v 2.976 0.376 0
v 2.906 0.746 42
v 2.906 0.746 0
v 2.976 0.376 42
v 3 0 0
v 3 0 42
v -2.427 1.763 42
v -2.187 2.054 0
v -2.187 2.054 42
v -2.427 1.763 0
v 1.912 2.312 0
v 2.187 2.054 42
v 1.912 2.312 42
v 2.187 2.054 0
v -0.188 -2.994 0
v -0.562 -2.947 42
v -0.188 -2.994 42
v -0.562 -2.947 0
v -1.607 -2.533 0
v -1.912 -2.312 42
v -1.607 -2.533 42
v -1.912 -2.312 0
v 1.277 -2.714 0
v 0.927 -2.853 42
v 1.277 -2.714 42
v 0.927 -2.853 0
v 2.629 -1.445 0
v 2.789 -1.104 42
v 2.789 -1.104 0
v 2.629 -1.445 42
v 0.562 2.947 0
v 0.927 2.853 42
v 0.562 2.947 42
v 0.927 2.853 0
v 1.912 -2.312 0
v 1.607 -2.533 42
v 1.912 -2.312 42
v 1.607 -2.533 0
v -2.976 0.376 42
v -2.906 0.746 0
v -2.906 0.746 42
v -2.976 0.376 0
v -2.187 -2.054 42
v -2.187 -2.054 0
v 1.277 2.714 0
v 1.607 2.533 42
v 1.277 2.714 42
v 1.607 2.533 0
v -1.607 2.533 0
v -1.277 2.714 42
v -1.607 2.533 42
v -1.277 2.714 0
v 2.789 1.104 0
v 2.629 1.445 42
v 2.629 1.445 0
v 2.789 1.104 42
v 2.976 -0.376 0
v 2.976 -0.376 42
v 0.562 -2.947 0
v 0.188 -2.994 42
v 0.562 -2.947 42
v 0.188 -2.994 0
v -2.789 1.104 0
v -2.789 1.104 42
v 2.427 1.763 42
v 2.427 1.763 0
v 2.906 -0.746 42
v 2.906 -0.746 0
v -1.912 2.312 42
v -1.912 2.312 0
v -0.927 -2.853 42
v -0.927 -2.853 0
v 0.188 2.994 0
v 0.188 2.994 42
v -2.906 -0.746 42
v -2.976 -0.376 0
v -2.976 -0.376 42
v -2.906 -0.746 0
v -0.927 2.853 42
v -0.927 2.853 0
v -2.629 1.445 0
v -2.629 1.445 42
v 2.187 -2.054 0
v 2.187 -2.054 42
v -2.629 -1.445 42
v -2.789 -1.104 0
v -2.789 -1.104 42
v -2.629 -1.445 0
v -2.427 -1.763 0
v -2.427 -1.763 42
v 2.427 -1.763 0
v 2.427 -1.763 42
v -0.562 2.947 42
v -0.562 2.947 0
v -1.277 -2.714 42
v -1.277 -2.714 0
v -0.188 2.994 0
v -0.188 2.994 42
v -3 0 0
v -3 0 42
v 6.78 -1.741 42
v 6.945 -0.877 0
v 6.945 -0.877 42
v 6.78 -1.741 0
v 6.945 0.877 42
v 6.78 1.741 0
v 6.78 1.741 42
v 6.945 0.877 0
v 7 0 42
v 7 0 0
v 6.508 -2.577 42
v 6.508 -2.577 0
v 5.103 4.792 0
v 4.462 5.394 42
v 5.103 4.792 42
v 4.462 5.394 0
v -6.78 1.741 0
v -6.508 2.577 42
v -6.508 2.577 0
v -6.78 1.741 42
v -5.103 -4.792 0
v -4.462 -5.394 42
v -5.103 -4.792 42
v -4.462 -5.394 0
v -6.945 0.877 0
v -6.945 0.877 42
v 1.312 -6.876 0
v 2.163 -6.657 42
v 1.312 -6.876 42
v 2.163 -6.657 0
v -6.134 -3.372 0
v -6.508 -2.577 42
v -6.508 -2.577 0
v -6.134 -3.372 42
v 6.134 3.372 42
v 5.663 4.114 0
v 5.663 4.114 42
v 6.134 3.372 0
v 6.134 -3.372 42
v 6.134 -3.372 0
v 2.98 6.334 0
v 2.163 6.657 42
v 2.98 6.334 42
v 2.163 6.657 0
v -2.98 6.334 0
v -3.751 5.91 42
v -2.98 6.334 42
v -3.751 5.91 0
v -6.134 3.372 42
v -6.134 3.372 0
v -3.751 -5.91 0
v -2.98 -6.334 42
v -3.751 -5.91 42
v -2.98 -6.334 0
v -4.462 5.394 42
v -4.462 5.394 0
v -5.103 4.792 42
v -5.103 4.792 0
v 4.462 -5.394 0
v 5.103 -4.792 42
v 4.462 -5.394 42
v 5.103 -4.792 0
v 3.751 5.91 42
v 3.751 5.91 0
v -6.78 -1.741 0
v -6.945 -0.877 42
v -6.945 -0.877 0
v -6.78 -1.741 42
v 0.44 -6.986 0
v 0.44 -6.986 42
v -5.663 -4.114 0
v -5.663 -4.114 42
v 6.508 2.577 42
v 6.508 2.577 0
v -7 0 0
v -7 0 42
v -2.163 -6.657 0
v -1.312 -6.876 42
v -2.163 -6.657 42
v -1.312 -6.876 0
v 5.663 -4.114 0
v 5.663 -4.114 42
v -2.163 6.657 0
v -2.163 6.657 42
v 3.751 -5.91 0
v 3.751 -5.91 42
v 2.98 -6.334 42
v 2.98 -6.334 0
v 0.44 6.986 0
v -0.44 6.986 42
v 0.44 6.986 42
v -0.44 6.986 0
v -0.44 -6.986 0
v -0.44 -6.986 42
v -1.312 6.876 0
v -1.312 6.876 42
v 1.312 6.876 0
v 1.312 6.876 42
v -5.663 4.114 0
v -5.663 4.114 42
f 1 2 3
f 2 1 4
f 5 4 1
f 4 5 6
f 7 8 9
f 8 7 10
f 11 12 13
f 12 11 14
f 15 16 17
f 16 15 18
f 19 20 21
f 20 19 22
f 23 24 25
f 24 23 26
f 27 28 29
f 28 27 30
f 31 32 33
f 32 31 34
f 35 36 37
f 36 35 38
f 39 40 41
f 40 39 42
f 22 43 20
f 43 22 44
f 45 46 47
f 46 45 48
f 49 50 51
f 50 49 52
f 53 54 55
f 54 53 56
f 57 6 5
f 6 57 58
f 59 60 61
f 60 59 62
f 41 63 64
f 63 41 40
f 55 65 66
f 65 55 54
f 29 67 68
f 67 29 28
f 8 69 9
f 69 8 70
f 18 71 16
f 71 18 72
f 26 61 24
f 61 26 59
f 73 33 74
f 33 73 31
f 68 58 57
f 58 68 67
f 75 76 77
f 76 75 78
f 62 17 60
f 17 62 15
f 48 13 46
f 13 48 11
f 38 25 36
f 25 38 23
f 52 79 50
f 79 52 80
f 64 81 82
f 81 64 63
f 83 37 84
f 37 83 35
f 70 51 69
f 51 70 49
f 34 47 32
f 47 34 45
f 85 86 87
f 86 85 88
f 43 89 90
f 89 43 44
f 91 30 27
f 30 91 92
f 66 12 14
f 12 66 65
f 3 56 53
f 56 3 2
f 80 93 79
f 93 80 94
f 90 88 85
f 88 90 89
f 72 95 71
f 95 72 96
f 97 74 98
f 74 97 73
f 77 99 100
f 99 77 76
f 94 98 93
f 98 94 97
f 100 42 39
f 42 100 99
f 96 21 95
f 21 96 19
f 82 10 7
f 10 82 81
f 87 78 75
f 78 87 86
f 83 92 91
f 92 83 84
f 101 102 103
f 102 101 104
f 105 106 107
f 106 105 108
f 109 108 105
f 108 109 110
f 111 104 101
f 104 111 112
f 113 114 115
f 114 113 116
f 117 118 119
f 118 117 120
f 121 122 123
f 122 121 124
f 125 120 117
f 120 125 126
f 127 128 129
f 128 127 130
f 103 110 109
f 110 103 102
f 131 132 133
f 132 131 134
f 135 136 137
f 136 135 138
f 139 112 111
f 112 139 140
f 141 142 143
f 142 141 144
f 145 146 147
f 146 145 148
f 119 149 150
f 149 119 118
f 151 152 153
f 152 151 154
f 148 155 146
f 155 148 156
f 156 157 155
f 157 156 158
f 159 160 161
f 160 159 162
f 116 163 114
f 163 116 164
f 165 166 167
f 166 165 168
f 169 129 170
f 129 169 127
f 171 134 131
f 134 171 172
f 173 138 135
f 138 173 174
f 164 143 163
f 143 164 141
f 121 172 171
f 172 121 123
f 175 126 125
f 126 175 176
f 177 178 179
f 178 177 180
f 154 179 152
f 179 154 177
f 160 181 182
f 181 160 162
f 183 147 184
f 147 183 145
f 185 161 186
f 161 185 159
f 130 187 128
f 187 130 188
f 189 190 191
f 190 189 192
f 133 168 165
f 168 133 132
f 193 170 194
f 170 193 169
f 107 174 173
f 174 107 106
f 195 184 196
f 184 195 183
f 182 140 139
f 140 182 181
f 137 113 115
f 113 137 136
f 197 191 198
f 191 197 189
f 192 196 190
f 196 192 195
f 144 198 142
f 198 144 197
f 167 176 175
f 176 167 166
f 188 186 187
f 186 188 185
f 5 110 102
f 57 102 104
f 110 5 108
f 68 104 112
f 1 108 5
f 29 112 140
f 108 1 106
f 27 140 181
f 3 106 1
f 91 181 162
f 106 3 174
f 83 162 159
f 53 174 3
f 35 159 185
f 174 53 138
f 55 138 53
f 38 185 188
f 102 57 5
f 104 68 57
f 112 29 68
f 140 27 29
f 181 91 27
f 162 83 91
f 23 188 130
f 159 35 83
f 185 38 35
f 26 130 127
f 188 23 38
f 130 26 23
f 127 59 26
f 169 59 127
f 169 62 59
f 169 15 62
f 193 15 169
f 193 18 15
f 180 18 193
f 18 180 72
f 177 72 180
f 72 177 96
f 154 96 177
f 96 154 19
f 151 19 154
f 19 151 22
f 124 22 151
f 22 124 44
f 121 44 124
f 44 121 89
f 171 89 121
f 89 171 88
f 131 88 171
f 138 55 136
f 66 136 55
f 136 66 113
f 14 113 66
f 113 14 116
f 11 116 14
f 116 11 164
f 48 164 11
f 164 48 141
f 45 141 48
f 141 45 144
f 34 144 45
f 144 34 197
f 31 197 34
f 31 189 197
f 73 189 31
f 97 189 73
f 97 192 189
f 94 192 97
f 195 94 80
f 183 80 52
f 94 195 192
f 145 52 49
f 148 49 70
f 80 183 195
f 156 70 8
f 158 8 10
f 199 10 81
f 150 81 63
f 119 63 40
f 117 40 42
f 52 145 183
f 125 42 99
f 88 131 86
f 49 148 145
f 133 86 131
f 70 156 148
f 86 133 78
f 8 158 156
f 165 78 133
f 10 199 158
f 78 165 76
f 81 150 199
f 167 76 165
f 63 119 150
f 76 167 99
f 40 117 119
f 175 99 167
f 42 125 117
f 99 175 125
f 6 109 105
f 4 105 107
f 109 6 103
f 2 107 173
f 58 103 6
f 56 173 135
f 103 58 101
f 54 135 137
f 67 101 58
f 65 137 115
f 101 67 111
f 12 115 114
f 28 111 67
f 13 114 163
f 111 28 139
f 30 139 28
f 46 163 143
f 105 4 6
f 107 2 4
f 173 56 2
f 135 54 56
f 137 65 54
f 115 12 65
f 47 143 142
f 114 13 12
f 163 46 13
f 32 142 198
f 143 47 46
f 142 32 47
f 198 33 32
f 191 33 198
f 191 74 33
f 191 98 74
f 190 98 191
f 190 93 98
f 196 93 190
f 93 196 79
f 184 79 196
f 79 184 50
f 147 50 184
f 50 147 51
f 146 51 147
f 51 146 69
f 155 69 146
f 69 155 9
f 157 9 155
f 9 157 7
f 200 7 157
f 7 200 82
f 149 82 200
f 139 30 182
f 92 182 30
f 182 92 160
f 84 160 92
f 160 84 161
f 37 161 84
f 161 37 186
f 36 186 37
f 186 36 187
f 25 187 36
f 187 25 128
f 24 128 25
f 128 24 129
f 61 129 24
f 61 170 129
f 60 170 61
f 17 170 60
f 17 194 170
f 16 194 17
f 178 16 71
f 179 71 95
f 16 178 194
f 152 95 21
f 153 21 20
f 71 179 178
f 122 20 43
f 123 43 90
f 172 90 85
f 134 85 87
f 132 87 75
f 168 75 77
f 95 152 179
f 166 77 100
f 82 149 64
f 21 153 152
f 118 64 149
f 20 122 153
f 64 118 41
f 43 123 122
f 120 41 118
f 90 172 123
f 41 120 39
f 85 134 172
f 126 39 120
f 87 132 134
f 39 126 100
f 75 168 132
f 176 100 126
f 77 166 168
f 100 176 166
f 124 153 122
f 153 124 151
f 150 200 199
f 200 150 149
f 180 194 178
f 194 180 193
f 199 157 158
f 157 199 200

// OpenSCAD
$fn = 50;


difference() {
	union() {
		cylinder(h = 42, r = 7.0000000000);
	}
	union() {
		translate(v = [0.0000000000, 0.0000000000, -100.0000000000]) {
			cylinder(h = 200, r = 3.0000000000);
		}
		translate(v = [0.0000000000, 0.0000000000, -100.0000000000]) {
			cylinder(h = 200, r = 3.0000000000);
		}
		translate(v = [0.0000000000, 0.0000000000, -100.0000000000]) {
			cylinder(h = 200, r = 3.0000000000);
		}
		translate(v = [0.0000000000, 0.0000000000, -100.0000000000]) {
			cylinder(h = 200, r = 3.0000000000);
		}
	}
}
